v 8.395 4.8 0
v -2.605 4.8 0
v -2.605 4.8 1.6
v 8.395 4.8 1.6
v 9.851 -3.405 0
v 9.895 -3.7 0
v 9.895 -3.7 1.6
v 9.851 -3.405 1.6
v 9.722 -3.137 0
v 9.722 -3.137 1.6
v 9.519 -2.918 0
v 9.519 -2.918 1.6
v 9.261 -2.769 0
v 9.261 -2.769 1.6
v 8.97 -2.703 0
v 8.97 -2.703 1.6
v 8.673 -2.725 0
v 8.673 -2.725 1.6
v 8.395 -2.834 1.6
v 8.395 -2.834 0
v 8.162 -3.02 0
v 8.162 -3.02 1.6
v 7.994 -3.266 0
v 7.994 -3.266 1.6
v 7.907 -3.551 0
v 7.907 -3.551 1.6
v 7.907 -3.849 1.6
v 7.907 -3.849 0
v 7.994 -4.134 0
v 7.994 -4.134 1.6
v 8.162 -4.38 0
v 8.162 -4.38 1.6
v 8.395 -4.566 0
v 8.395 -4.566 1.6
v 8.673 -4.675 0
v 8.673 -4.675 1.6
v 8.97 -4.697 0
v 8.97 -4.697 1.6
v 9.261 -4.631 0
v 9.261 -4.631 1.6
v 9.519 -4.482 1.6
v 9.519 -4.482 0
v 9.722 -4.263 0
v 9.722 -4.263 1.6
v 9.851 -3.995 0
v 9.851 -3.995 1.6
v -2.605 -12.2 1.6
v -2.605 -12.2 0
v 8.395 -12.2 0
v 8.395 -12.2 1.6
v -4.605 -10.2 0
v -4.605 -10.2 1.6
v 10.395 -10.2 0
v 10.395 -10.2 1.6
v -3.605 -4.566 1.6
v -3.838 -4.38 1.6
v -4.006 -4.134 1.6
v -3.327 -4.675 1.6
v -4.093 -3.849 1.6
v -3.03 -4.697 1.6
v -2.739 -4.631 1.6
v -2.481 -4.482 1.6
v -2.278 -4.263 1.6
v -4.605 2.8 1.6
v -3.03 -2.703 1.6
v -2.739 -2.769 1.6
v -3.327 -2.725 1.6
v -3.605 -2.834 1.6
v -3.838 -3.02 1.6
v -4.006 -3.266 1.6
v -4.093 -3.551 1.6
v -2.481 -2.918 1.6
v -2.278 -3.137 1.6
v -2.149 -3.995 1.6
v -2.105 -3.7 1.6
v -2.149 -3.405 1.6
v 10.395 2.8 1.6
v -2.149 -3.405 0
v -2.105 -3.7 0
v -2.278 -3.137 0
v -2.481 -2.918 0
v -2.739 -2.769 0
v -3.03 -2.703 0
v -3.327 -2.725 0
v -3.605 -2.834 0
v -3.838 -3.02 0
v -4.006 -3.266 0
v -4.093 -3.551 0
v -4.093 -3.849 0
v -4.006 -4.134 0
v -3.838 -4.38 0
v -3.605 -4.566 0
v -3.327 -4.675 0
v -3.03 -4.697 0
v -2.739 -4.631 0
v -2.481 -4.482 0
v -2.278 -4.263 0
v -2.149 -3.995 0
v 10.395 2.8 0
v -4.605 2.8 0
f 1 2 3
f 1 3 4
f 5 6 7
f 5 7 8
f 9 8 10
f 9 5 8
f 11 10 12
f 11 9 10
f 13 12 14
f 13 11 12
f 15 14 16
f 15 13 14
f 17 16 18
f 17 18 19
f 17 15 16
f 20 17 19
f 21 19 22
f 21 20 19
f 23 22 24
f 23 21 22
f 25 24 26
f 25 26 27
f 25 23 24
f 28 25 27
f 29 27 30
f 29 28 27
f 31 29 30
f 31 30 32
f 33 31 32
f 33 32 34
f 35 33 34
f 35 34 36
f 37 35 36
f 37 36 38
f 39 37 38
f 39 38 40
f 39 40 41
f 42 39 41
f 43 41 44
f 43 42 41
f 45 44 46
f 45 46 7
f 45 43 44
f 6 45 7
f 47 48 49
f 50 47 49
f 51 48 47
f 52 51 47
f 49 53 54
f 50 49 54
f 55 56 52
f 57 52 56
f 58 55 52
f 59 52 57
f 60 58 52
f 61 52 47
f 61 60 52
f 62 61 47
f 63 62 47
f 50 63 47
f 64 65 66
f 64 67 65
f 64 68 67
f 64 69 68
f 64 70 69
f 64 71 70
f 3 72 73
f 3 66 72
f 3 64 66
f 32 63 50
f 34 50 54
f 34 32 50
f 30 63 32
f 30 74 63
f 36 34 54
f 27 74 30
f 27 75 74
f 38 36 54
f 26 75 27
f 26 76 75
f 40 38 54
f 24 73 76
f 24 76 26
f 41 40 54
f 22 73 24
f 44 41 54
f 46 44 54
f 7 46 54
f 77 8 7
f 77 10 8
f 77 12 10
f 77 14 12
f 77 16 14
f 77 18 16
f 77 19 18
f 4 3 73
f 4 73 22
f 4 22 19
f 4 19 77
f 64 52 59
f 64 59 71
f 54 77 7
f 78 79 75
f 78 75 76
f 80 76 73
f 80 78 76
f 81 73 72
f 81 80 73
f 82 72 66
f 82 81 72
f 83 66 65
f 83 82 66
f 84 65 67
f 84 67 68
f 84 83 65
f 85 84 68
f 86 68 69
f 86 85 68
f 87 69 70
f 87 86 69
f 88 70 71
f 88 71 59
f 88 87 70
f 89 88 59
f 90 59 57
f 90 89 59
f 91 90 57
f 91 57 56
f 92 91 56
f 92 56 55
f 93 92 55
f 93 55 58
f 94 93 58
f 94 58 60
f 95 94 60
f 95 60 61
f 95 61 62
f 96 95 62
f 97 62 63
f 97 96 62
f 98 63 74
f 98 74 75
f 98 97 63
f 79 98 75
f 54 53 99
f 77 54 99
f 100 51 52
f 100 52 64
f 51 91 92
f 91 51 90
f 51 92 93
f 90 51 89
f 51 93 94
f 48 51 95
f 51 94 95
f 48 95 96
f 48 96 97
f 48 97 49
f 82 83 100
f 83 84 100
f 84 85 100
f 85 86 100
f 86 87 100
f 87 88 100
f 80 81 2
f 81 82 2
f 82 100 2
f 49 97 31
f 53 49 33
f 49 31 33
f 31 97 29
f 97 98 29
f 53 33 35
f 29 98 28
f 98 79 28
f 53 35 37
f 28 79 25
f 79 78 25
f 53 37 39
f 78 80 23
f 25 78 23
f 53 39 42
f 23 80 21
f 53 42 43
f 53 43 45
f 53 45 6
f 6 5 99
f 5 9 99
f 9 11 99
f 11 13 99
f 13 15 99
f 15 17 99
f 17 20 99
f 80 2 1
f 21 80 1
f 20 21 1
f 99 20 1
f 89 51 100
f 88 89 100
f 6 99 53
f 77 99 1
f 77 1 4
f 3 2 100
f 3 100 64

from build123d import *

# Parameters (mm, degrees)
ESBO_O1_W                = 15
ESBO_O1_H                = 17
ESBO_O1_R                = 1
RESSALTO_EXTRUS_O1_DEPTH = 1.6
CHANFRO1_SIZE            = 2


with BuildPart() as part:
    # Esboço1 → Ressalto-extrusão1 (new body)
    with BuildSketch(Plane.XY):
        with Locations((2.895389518, -3.7)):
            Rectangle(ESBO_O1_W, ESBO_O1_H)
        with Locations((8.895389518, -3.7)):
            Circle(ESBO_O1_R, mode=Mode.SUBTRACT)
        with Locations((-3.104610482, -3.7)):
            Circle(ESBO_O1_R, mode=Mode.SUBTRACT)
    extrude(amount=RESSALTO_EXTRUS_O1_DEPTH)

    # Chanfro1
    chanfro1_edges = [part.edges().sort_by_distance(p)[0] for p in [
        (-4.604610482, 4.8, 0.8),
        (10.395389518, 4.8, 0.8),
        (10.395389518, -12.2, 0.8),
        (-4.604610482, -12.2, 0.8),
    ]]
    chamfer(chanfro1_edges, length=CHANFRO1_SIZE)


solid = part.part
